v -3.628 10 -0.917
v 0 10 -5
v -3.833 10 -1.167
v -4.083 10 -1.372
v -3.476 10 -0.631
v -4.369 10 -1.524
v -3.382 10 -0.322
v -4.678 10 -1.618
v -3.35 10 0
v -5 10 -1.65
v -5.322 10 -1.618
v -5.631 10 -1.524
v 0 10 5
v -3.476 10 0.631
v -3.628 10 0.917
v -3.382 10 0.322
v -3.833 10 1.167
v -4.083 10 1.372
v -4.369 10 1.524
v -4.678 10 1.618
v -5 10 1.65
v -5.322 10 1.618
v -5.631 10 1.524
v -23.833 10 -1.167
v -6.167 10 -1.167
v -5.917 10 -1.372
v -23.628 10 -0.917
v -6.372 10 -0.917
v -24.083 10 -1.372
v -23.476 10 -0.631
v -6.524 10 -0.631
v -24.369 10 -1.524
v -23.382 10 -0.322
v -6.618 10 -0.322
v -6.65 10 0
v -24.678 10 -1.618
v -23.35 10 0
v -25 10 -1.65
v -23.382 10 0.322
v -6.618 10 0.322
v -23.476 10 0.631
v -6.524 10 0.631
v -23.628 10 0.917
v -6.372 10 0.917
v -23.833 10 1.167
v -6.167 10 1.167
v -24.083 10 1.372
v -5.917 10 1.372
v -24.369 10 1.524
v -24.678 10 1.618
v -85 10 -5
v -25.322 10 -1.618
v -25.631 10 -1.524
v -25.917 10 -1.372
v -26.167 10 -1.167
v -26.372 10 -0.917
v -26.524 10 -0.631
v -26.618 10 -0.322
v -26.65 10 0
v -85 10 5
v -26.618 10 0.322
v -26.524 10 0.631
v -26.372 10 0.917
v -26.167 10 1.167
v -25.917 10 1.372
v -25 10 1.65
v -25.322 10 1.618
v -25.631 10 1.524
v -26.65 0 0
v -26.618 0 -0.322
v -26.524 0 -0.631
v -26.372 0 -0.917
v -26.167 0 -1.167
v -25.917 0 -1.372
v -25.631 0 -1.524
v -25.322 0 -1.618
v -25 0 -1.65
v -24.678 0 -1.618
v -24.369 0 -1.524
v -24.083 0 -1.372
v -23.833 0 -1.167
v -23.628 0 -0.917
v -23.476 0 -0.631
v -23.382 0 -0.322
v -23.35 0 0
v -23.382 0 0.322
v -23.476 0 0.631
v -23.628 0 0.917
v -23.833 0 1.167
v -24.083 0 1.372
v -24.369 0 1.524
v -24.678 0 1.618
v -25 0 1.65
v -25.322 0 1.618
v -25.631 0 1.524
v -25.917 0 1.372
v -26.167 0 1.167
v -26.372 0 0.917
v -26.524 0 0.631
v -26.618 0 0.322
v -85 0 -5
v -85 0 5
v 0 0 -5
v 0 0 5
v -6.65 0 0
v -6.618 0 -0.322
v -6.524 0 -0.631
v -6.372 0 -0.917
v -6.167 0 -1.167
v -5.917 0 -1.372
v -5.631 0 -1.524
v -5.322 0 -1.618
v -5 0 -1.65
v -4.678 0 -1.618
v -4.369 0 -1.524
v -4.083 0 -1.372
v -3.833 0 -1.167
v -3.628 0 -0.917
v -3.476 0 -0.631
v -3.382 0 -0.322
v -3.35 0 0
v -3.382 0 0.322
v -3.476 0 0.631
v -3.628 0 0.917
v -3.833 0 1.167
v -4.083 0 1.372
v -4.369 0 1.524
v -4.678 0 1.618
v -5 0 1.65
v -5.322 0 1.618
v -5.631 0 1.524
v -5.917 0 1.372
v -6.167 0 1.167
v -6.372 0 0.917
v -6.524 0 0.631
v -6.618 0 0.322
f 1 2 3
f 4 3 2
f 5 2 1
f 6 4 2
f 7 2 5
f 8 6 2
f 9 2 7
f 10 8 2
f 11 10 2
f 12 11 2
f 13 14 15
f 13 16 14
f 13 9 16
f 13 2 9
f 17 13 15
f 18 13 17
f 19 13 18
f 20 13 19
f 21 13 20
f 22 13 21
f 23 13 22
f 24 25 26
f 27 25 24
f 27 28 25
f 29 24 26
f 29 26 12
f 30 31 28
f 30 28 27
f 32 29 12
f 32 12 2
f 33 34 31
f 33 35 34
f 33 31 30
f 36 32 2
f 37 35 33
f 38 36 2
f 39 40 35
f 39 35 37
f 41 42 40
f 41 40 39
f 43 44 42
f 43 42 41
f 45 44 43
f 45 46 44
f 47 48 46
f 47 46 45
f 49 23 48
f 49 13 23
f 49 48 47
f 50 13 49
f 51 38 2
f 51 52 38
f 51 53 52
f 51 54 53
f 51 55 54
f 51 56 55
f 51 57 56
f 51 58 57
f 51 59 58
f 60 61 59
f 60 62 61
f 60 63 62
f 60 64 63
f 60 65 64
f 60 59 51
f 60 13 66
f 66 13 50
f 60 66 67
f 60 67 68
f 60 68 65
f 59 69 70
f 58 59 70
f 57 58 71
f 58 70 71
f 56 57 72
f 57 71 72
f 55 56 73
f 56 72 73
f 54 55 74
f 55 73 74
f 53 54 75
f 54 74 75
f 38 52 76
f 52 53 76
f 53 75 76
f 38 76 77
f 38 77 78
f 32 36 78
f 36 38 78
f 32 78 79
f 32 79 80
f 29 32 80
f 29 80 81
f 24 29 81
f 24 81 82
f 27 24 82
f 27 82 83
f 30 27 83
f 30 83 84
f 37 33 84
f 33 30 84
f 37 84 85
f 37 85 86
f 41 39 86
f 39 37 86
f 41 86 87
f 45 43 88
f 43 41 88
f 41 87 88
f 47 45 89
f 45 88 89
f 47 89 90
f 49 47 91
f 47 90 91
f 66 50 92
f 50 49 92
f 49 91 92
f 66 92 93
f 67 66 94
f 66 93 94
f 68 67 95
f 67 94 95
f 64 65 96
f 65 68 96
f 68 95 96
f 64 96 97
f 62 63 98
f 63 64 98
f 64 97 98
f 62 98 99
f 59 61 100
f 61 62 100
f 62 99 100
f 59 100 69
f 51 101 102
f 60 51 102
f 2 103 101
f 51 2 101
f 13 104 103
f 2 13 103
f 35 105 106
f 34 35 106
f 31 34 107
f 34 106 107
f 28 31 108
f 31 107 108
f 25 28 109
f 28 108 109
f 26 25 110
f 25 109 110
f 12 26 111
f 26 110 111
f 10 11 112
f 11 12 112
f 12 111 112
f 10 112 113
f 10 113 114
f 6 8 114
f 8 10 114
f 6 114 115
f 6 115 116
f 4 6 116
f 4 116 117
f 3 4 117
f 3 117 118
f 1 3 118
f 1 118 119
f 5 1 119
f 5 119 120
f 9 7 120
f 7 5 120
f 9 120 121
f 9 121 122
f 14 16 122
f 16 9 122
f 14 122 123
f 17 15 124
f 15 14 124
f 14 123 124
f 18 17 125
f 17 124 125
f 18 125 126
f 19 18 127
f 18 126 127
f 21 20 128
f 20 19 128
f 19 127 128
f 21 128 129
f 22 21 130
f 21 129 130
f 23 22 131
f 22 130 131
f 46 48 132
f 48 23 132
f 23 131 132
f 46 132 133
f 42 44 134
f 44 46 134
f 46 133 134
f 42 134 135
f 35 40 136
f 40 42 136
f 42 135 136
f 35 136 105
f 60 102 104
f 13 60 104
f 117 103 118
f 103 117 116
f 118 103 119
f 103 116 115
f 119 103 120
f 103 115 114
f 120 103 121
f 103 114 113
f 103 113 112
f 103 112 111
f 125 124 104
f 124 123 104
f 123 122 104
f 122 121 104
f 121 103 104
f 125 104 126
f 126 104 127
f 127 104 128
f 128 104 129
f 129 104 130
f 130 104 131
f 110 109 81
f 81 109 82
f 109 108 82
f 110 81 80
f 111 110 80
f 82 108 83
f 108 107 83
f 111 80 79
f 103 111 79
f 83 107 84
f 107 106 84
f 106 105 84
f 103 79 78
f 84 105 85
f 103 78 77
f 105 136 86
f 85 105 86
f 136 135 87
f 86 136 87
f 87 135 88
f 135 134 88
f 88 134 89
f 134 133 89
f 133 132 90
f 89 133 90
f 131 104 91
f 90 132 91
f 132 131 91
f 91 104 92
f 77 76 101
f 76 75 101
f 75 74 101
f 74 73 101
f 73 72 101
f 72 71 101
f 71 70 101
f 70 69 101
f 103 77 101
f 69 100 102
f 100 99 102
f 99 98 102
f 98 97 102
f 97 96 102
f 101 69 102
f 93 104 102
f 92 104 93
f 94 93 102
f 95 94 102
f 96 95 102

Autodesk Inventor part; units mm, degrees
ref_plane "YZ Plane" through (0, 0, 0) normal (1, 0, 0) x (0, 1, 0)
ref_plane "XZ Plane" through (0, 0, 0) normal (0, 1, 0) x (-1, 0, 0)
ref_plane "XY Plane" through (0, 0, 0) normal (0, 0, 1) x (1, 0, 0)
sketch "Sketch1" plane through (0, 0, 0) normal (0, 1, 0) x (-1, 0, 0)
  line L0 (85, 5) -> (0, 5)
  line L1 (0, 5) -> (0, -5)
  line L2 (0, -5) -> (85, -5)
  line L3 (85, -5) -> (85, 5)
  line L4 (25, 0) -> (5, 0) construction
  circle A0 centre (25, 0) radius 1.65
  circle A1 centre (5, 0) radius 1.65
  point P0 (0, 0)
  point P1 (0, 0)
  dimension "d0" = 10
  dimension "d1" = 20
  dimension "d2" = 3.3
  dimension "d3" = 5
  dimension "d6" = 85
extrude "Extrusion1" add sketch "Sketch1" along normal blind 10
properties part number "Tope X" material "Polypropylene"
